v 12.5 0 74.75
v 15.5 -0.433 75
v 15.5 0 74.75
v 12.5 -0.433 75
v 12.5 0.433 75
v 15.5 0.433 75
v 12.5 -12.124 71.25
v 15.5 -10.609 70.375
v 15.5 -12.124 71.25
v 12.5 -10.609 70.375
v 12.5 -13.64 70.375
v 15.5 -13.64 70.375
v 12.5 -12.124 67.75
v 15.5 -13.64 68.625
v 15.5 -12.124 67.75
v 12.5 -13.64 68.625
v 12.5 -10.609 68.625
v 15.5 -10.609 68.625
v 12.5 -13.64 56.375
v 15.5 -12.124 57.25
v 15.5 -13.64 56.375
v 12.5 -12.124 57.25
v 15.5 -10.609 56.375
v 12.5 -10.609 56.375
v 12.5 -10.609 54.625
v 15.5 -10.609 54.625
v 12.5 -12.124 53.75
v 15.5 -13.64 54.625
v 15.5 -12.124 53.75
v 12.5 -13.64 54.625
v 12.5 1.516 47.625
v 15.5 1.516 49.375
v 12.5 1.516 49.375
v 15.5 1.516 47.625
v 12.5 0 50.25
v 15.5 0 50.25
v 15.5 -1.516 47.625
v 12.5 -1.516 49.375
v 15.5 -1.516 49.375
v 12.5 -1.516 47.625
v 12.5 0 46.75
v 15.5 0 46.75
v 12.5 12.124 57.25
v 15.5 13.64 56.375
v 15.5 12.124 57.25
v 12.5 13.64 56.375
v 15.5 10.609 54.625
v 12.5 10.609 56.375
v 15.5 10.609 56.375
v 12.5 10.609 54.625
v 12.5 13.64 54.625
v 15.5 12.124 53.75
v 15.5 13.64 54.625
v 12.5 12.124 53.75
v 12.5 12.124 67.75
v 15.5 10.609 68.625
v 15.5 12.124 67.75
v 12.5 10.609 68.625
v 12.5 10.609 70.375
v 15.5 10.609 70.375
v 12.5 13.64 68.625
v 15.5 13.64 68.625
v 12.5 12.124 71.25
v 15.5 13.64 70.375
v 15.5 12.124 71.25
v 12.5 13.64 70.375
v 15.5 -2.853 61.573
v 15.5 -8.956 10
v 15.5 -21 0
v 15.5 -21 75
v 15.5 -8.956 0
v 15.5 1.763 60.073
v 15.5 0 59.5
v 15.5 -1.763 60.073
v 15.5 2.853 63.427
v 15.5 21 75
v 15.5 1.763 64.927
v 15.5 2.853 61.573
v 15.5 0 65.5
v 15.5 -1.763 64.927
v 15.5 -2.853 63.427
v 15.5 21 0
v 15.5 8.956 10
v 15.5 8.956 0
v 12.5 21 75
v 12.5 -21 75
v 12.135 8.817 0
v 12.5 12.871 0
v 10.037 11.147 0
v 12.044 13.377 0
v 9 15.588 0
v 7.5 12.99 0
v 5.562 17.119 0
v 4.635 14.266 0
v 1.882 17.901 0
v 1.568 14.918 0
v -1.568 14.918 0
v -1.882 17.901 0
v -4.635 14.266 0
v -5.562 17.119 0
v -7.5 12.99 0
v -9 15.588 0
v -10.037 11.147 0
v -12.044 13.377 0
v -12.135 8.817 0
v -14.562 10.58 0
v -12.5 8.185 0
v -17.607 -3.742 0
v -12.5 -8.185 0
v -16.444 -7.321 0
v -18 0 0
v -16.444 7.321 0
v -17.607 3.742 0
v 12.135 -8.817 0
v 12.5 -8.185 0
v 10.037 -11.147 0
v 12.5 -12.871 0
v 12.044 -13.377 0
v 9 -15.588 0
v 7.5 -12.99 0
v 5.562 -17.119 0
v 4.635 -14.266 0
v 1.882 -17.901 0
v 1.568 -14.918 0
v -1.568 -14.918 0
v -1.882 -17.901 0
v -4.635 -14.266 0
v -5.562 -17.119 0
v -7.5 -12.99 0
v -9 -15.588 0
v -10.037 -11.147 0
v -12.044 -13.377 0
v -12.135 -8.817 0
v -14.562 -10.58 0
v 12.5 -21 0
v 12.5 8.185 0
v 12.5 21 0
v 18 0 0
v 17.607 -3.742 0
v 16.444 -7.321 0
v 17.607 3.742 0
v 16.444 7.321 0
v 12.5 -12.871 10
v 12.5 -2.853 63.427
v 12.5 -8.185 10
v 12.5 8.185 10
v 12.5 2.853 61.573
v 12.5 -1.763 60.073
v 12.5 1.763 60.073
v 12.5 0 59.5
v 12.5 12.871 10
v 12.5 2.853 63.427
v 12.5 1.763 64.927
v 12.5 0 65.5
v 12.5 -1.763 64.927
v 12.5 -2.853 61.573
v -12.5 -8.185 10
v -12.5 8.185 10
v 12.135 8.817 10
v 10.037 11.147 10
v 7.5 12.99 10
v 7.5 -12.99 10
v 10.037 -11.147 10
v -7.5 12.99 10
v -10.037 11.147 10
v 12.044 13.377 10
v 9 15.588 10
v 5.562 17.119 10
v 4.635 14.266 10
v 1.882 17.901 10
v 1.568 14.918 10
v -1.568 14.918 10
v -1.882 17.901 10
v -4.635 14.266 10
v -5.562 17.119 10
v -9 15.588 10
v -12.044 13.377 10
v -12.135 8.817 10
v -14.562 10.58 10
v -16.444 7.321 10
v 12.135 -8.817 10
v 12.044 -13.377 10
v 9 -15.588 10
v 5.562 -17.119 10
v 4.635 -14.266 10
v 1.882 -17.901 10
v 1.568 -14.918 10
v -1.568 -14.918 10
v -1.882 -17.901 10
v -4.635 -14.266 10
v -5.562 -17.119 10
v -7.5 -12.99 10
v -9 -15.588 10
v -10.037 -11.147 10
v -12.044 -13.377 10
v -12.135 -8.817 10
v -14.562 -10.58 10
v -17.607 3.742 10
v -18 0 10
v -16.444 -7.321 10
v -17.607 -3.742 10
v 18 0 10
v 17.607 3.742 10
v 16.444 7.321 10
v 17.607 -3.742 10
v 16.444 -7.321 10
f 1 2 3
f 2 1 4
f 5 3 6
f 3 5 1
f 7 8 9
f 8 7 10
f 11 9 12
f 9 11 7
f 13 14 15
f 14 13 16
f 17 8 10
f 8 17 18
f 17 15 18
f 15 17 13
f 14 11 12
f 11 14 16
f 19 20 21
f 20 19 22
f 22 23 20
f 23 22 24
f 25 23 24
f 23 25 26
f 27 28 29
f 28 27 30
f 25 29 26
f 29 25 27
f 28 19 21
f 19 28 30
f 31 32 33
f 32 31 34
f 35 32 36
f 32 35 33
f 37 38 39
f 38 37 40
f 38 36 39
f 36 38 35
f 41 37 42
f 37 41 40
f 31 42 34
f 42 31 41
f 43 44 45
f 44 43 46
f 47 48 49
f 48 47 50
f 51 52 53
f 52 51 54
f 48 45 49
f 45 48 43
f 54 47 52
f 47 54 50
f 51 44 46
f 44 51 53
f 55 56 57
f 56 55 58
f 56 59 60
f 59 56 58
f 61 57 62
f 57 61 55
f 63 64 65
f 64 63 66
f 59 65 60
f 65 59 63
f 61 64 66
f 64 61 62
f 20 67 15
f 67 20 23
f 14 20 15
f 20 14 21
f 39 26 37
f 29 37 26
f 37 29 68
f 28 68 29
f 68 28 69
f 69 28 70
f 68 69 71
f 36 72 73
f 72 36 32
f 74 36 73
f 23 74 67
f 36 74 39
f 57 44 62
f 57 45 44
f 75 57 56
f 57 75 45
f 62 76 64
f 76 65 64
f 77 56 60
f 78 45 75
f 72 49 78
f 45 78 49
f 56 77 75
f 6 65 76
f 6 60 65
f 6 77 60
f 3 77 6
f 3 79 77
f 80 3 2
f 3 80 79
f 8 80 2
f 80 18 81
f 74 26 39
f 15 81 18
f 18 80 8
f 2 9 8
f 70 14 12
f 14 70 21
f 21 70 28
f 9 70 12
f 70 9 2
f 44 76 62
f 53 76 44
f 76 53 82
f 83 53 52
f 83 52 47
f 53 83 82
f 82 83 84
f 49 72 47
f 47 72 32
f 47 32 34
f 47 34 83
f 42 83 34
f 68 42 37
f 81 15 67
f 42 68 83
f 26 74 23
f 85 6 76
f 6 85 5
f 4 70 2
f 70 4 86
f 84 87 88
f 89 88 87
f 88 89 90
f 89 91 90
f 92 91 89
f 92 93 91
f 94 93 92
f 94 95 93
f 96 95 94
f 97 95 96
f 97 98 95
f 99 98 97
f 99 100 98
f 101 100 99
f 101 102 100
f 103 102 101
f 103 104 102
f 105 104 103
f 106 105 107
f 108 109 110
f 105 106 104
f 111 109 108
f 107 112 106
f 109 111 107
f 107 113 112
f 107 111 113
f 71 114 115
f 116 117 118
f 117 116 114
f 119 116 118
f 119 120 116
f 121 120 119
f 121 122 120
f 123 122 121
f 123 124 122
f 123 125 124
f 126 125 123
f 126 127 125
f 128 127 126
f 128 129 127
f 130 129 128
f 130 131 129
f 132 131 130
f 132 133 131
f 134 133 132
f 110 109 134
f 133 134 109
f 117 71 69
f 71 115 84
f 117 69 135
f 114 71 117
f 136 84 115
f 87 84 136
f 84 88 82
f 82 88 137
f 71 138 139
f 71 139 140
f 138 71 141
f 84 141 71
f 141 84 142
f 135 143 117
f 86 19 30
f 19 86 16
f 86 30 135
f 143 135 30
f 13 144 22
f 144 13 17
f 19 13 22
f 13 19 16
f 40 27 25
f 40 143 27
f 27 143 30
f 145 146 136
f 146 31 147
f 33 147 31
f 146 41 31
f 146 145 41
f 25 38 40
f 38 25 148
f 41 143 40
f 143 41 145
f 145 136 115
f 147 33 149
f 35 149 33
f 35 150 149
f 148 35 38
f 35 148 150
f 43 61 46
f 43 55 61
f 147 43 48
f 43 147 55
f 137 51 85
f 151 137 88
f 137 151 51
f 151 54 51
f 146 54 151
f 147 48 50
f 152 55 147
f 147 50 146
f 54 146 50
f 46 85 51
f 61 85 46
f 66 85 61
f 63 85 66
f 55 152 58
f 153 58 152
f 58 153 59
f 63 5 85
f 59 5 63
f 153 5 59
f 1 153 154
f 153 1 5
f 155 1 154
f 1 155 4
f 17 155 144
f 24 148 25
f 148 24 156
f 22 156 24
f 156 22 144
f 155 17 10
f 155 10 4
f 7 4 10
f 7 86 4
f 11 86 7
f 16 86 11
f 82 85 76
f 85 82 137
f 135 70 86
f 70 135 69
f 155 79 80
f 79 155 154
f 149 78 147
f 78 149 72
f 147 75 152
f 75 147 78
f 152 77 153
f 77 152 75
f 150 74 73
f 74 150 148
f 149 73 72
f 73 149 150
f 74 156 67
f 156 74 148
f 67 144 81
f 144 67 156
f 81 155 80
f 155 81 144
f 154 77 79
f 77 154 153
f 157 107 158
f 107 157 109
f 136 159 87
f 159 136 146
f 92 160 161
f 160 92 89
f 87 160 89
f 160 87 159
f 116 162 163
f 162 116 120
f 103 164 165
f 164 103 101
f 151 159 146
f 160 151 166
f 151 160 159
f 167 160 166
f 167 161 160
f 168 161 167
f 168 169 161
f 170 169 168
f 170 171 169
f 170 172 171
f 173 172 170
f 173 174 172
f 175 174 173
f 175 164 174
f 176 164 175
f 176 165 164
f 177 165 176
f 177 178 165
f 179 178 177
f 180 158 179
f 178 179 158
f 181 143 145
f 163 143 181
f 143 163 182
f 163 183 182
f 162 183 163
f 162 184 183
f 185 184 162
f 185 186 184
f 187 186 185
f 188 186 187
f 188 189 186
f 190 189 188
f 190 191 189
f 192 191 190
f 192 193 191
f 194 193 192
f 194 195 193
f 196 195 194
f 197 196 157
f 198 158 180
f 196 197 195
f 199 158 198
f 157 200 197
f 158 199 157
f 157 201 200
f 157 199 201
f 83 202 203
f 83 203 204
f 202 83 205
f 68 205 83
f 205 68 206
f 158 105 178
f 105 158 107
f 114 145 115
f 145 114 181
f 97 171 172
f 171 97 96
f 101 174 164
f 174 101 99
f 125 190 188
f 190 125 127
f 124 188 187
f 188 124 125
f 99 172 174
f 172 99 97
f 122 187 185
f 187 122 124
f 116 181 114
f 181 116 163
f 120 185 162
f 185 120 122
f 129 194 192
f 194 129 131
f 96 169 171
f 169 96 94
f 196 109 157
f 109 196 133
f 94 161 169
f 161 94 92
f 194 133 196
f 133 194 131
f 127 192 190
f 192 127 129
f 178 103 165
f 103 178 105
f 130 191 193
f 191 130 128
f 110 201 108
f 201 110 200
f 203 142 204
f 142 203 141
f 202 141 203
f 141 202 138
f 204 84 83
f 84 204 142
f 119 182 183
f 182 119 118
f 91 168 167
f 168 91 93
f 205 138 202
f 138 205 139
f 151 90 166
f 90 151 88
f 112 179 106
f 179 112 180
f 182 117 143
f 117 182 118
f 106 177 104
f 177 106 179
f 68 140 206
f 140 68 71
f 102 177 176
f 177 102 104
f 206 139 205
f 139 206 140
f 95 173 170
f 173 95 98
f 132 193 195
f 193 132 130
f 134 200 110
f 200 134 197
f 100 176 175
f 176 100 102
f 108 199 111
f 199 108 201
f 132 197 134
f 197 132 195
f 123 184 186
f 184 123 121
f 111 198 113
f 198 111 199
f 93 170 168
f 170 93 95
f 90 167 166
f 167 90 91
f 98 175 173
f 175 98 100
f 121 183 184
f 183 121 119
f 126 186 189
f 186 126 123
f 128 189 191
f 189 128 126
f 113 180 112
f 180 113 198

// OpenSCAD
D_BIG = 30;
CUT_BIG = 25;
H_BIG = 10;

WALL_TH = 3;

WALL_H = 50;

HOLE_CIRCLE_R = 14;
HOLE_D = 3.5;
AXLE_D = 6;

module handle() {
    difference() {
        cylinder(d=D_BIG, h=H_BIG, center=true);
        for(i = [-1, +1]) translate([i*(500+CUT_BIG/2),0,0]) cube([1000,1000,1000], center=true);
    }
}

// for (i = [0:5]) {rotate([0,0,60*i]) translate([14,0,0]) cylinder(d=3.5, h=100, center=true);}
translate([CUT_BIG/2+WALL_TH/2,0,1.5*WALL_H/2]) difference() {
    cube([WALL_TH, 3*HOLE_CIRCLE_R, 1.5*WALL_H], center=true);
    translate([0,0,WALL_H/2]) rotate([0,90,0]) cylinder(d=AXLE_D, h=1000, center=true);
    for (i = [0:5]) translate([0,0,WALL_H/2]) rotate([i*60,0,0]) translate([0,0,HOLE_CIRCLE_R]) rotate([0,90,0]) cylinder(d=HOLE_D, h=1000, center=true);
};
translate([0,0,H_BIG/2]) difference() {
    cylinder(d=D_BIG+2*WALL_TH, h=H_BIG, center=true);
    handle();
}
